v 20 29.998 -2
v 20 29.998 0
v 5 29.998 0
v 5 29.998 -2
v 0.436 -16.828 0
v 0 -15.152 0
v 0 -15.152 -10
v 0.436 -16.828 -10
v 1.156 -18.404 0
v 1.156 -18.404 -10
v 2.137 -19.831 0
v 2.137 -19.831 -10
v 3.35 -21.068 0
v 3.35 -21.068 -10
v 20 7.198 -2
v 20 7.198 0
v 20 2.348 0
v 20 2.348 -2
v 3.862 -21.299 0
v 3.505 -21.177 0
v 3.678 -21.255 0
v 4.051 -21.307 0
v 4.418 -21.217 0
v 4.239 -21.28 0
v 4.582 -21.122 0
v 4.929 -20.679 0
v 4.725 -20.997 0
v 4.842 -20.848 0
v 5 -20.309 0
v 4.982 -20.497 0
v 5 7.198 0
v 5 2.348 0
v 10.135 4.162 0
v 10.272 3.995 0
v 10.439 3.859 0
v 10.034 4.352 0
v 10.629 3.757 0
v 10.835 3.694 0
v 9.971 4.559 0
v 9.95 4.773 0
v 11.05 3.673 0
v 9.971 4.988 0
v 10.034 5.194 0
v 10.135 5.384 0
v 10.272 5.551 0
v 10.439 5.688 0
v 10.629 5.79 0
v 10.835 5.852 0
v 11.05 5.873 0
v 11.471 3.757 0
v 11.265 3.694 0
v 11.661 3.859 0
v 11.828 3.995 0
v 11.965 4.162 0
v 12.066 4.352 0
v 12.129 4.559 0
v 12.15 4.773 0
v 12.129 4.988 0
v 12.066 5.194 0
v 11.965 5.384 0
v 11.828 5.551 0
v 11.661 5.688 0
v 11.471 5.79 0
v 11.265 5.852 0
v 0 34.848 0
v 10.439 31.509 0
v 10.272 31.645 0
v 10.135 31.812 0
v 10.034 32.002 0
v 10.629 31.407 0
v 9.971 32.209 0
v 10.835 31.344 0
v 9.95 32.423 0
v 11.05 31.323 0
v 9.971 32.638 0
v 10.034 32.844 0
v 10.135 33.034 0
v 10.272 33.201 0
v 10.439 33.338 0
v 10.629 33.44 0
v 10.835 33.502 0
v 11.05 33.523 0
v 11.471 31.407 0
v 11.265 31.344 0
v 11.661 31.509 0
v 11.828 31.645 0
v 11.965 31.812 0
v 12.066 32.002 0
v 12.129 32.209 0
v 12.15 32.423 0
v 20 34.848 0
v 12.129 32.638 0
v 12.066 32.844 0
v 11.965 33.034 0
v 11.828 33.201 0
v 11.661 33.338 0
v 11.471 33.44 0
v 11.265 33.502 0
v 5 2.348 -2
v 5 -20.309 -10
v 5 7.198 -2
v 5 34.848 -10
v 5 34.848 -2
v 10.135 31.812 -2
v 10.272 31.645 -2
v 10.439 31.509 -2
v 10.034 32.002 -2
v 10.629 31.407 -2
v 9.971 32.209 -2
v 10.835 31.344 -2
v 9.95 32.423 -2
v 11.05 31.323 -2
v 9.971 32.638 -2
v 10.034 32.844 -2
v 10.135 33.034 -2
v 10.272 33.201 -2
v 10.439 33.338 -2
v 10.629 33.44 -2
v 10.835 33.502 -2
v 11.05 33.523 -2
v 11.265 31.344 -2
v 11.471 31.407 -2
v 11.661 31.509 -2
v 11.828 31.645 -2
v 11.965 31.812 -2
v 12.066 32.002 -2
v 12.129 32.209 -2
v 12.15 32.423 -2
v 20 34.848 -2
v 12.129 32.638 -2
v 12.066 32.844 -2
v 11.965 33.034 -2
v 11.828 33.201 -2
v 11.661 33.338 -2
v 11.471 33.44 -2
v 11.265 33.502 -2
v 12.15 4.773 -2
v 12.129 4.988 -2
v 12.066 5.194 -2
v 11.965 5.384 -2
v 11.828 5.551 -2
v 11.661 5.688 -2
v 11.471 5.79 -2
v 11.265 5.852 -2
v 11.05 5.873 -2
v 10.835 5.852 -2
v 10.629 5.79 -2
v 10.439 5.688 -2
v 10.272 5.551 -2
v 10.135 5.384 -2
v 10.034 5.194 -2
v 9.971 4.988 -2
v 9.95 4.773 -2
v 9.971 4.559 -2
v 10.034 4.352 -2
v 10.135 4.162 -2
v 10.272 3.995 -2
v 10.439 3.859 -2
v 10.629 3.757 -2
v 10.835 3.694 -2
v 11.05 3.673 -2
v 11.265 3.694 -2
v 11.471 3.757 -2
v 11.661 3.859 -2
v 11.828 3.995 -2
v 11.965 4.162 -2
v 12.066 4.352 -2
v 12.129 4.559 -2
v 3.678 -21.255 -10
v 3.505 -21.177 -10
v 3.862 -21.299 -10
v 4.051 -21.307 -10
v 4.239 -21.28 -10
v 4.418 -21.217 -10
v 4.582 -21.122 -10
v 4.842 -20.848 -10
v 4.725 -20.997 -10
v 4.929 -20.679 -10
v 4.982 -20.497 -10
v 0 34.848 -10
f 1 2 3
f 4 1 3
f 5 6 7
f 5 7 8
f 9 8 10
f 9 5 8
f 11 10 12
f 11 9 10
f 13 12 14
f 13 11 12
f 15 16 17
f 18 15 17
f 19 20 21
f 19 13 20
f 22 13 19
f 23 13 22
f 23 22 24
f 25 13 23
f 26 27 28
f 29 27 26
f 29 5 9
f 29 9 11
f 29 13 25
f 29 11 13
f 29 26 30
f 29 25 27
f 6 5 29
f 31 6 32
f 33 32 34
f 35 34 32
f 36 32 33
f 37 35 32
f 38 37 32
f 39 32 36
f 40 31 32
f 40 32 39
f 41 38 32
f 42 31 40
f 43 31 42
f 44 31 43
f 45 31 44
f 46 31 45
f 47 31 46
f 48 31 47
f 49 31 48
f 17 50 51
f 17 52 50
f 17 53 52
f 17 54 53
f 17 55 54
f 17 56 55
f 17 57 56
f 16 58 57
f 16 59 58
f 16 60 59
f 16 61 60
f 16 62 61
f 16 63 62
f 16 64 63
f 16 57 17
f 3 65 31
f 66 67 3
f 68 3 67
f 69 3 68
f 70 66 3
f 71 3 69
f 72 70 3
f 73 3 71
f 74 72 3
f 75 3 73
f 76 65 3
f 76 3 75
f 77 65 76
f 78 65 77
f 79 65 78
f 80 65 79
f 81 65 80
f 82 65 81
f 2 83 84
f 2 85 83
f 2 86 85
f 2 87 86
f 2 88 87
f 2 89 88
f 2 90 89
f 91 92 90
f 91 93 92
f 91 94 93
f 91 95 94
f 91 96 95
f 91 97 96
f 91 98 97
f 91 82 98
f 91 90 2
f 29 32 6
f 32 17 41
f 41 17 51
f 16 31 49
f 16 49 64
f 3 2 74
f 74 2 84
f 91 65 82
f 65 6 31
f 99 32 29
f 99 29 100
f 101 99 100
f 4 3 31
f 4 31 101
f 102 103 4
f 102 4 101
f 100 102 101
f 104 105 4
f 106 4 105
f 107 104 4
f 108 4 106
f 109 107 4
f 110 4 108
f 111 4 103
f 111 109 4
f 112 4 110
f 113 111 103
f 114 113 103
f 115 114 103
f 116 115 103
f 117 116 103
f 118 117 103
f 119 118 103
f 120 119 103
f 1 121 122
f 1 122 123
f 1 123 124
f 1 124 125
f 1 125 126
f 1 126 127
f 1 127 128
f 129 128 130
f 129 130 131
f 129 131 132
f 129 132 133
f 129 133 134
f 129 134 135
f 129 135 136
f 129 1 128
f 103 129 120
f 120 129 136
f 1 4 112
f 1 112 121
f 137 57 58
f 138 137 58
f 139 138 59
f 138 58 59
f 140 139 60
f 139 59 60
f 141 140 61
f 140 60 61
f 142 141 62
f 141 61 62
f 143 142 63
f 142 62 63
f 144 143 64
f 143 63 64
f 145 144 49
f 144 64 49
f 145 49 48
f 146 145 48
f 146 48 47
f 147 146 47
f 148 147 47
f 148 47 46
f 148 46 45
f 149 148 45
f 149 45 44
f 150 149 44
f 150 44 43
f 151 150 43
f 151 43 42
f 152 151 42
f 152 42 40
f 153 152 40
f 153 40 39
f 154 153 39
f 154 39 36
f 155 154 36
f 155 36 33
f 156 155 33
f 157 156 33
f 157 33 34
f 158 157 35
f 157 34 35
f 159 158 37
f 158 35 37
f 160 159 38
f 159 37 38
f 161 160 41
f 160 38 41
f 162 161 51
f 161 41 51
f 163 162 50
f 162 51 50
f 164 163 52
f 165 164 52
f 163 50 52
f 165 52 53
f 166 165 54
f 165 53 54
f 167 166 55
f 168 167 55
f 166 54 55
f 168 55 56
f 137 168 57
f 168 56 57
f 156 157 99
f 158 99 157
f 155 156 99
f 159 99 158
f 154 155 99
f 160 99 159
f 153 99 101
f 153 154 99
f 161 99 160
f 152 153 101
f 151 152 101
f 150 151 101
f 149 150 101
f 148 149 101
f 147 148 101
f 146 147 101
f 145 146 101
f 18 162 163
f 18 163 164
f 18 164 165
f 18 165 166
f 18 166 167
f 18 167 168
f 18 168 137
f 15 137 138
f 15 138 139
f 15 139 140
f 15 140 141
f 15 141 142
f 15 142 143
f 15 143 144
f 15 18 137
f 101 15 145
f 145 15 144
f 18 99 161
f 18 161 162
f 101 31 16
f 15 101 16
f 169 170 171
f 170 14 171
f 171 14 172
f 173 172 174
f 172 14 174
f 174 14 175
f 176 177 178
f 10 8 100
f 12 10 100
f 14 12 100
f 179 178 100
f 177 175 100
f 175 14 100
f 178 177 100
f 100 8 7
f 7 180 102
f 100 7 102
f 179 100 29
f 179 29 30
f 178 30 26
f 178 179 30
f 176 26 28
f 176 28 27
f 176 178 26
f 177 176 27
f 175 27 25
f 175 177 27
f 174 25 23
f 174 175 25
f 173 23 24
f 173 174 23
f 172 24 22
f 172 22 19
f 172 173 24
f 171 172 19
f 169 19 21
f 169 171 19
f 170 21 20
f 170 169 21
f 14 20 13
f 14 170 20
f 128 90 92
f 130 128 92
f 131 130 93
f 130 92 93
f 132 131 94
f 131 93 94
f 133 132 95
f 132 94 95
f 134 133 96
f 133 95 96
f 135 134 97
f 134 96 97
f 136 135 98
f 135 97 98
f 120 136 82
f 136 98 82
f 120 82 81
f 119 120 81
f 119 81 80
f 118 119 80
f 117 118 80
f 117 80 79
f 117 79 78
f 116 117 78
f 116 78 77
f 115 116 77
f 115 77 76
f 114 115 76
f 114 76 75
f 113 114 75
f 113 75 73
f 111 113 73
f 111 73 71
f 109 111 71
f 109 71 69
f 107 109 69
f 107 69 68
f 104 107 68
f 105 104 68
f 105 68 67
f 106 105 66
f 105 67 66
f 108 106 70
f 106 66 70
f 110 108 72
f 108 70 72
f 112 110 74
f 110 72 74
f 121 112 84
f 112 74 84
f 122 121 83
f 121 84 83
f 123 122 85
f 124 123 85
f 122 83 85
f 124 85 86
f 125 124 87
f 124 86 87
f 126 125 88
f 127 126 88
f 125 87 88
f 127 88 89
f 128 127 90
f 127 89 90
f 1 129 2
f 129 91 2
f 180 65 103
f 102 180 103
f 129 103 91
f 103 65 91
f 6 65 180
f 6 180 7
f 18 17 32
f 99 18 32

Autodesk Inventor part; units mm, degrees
ref_plane "YZ Plane" through (0, 0, 0) normal (1, 0, 0) x (0, 1, 0)
ref_plane "XZ Plane" through (0, 0, 0) normal (0, 1, 0) x (-1, 0, 0)
ref_plane "XY Plane" through (0, 0, 0) normal (0, 0, 1) x (1, 0, 0)
sketch "Sketch1" plane through (0, 0, 0) normal (0, 0, 1) x (1, 0, 0)
  line L0 (0, 34.8483) -> (20, 34.8483)
  line L1 (20, 34.8483) -> (20, 29.9983)
  line L2 (0, 34.8483) -> (0, 0)
  line L3 (20, 29.9983) -> (5, 29.9983)
  line L4 (5, 29.9983) -> (5, 7.1983)
  line L5 (5, 7.1983) -> (20, 7.1983)
  line L6 (20, 7.1983) -> (20, 2.3483)
  line L7 (20, 2.3483) -> (5, 2.3483)
  line L8 (0, 0) -> (0, -15.1517)
  line L9 (5, -15.1517) -> (5, 2.3483)
  line L10 (5, -15.1517) -> (5, -22.2152)
  arc A0 (0, -15.1517) -> (5, -22.2152) centre (9.8436, -13.4852) ccw
  dimension "d14" = 20
  dimension "d15" = 4.85
  dimension "d17" = 4.85
  dimension "d18" = 22.8
  dimension "d19" = 20
  dimension "d20" = 5
  dimension "d22" = 9.9837
  dimension "d23" = 90
  dimension "d24" = 29.9983
  dimension "d25" = 10.1564
  dimension "d26" = 43.4835
  dimension "d27" = 45.15
extrude "Extrusion1" add sketch "Sketch1" against normal blind 10
sketch "Sketch2" plane through (20, 29.9983, 0) normal (1, 0, 0) x (0, 0, -1)
  line L0 (0, 0) -> (10, 0) projected
  line L1 (2, 0) -> (2, 4.85)
  line L2 (0, 4.85) -> (10, 4.85) projected
  line L3 (2, 4.85) -> (10, 4.85)
  line L4 (10, 4.85) -> (10, 0)
  line L5 (10, -45.15) -> (10, 4.85) projected
  line L6 (0, 0) -> (0, 4.85) projected
  line L7 (0, 0) -> (10, 0) projected
  line L8 (2, 0) -> (10, 0)
  line L9 (10, -22.8) -> (10, -27.65) projected
  line L10 (2, -27.65) -> (2, -22.8)
  line L11 (2, -22.8) -> (10, -22.8)
  line L12 (10, -22.8) -> (10, -27.65)
  line L13 (2, -27.65) -> (10, -27.65)
  point P0 (0, -29.9983)
  point P1 (10, -11.4)
  dimension "d30" = 2
  dimension "d33" = 11.4
  dimension "d36" = 27.65
extrude "Extrusion2" cut sketch "Sketch2" against normal blind 15 contours L5 L13 L10 L11 | L1 L2 L4 L0
fillet "Fillet1" radius 1 1 edges at (5, -22.2152, -5)
sketch "Sketch3" plane through (0, 0, 0) normal (0, 0, 1) x (1, 0, 0)
  line L0 (20, 34.8483) -> (0, 34.8483) projected
  line L1 (5, 7.1983) -> (5, 29.9983) projected
  circle A0 centre (11.05, 32.4233) radius 1.1
  circle A1 centre (11.05, 4.7733) radius 1.1
  point P0 (0, 0)
  dimension "d42" = 2.425
  dimension "d43" = 6.05
  dimension "d44" = 1.1
  dimension "d47" = 27.65
extrude "Extrusion3" cut sketch "Sketch3" against normal blind 15
properties part number "first joint"
